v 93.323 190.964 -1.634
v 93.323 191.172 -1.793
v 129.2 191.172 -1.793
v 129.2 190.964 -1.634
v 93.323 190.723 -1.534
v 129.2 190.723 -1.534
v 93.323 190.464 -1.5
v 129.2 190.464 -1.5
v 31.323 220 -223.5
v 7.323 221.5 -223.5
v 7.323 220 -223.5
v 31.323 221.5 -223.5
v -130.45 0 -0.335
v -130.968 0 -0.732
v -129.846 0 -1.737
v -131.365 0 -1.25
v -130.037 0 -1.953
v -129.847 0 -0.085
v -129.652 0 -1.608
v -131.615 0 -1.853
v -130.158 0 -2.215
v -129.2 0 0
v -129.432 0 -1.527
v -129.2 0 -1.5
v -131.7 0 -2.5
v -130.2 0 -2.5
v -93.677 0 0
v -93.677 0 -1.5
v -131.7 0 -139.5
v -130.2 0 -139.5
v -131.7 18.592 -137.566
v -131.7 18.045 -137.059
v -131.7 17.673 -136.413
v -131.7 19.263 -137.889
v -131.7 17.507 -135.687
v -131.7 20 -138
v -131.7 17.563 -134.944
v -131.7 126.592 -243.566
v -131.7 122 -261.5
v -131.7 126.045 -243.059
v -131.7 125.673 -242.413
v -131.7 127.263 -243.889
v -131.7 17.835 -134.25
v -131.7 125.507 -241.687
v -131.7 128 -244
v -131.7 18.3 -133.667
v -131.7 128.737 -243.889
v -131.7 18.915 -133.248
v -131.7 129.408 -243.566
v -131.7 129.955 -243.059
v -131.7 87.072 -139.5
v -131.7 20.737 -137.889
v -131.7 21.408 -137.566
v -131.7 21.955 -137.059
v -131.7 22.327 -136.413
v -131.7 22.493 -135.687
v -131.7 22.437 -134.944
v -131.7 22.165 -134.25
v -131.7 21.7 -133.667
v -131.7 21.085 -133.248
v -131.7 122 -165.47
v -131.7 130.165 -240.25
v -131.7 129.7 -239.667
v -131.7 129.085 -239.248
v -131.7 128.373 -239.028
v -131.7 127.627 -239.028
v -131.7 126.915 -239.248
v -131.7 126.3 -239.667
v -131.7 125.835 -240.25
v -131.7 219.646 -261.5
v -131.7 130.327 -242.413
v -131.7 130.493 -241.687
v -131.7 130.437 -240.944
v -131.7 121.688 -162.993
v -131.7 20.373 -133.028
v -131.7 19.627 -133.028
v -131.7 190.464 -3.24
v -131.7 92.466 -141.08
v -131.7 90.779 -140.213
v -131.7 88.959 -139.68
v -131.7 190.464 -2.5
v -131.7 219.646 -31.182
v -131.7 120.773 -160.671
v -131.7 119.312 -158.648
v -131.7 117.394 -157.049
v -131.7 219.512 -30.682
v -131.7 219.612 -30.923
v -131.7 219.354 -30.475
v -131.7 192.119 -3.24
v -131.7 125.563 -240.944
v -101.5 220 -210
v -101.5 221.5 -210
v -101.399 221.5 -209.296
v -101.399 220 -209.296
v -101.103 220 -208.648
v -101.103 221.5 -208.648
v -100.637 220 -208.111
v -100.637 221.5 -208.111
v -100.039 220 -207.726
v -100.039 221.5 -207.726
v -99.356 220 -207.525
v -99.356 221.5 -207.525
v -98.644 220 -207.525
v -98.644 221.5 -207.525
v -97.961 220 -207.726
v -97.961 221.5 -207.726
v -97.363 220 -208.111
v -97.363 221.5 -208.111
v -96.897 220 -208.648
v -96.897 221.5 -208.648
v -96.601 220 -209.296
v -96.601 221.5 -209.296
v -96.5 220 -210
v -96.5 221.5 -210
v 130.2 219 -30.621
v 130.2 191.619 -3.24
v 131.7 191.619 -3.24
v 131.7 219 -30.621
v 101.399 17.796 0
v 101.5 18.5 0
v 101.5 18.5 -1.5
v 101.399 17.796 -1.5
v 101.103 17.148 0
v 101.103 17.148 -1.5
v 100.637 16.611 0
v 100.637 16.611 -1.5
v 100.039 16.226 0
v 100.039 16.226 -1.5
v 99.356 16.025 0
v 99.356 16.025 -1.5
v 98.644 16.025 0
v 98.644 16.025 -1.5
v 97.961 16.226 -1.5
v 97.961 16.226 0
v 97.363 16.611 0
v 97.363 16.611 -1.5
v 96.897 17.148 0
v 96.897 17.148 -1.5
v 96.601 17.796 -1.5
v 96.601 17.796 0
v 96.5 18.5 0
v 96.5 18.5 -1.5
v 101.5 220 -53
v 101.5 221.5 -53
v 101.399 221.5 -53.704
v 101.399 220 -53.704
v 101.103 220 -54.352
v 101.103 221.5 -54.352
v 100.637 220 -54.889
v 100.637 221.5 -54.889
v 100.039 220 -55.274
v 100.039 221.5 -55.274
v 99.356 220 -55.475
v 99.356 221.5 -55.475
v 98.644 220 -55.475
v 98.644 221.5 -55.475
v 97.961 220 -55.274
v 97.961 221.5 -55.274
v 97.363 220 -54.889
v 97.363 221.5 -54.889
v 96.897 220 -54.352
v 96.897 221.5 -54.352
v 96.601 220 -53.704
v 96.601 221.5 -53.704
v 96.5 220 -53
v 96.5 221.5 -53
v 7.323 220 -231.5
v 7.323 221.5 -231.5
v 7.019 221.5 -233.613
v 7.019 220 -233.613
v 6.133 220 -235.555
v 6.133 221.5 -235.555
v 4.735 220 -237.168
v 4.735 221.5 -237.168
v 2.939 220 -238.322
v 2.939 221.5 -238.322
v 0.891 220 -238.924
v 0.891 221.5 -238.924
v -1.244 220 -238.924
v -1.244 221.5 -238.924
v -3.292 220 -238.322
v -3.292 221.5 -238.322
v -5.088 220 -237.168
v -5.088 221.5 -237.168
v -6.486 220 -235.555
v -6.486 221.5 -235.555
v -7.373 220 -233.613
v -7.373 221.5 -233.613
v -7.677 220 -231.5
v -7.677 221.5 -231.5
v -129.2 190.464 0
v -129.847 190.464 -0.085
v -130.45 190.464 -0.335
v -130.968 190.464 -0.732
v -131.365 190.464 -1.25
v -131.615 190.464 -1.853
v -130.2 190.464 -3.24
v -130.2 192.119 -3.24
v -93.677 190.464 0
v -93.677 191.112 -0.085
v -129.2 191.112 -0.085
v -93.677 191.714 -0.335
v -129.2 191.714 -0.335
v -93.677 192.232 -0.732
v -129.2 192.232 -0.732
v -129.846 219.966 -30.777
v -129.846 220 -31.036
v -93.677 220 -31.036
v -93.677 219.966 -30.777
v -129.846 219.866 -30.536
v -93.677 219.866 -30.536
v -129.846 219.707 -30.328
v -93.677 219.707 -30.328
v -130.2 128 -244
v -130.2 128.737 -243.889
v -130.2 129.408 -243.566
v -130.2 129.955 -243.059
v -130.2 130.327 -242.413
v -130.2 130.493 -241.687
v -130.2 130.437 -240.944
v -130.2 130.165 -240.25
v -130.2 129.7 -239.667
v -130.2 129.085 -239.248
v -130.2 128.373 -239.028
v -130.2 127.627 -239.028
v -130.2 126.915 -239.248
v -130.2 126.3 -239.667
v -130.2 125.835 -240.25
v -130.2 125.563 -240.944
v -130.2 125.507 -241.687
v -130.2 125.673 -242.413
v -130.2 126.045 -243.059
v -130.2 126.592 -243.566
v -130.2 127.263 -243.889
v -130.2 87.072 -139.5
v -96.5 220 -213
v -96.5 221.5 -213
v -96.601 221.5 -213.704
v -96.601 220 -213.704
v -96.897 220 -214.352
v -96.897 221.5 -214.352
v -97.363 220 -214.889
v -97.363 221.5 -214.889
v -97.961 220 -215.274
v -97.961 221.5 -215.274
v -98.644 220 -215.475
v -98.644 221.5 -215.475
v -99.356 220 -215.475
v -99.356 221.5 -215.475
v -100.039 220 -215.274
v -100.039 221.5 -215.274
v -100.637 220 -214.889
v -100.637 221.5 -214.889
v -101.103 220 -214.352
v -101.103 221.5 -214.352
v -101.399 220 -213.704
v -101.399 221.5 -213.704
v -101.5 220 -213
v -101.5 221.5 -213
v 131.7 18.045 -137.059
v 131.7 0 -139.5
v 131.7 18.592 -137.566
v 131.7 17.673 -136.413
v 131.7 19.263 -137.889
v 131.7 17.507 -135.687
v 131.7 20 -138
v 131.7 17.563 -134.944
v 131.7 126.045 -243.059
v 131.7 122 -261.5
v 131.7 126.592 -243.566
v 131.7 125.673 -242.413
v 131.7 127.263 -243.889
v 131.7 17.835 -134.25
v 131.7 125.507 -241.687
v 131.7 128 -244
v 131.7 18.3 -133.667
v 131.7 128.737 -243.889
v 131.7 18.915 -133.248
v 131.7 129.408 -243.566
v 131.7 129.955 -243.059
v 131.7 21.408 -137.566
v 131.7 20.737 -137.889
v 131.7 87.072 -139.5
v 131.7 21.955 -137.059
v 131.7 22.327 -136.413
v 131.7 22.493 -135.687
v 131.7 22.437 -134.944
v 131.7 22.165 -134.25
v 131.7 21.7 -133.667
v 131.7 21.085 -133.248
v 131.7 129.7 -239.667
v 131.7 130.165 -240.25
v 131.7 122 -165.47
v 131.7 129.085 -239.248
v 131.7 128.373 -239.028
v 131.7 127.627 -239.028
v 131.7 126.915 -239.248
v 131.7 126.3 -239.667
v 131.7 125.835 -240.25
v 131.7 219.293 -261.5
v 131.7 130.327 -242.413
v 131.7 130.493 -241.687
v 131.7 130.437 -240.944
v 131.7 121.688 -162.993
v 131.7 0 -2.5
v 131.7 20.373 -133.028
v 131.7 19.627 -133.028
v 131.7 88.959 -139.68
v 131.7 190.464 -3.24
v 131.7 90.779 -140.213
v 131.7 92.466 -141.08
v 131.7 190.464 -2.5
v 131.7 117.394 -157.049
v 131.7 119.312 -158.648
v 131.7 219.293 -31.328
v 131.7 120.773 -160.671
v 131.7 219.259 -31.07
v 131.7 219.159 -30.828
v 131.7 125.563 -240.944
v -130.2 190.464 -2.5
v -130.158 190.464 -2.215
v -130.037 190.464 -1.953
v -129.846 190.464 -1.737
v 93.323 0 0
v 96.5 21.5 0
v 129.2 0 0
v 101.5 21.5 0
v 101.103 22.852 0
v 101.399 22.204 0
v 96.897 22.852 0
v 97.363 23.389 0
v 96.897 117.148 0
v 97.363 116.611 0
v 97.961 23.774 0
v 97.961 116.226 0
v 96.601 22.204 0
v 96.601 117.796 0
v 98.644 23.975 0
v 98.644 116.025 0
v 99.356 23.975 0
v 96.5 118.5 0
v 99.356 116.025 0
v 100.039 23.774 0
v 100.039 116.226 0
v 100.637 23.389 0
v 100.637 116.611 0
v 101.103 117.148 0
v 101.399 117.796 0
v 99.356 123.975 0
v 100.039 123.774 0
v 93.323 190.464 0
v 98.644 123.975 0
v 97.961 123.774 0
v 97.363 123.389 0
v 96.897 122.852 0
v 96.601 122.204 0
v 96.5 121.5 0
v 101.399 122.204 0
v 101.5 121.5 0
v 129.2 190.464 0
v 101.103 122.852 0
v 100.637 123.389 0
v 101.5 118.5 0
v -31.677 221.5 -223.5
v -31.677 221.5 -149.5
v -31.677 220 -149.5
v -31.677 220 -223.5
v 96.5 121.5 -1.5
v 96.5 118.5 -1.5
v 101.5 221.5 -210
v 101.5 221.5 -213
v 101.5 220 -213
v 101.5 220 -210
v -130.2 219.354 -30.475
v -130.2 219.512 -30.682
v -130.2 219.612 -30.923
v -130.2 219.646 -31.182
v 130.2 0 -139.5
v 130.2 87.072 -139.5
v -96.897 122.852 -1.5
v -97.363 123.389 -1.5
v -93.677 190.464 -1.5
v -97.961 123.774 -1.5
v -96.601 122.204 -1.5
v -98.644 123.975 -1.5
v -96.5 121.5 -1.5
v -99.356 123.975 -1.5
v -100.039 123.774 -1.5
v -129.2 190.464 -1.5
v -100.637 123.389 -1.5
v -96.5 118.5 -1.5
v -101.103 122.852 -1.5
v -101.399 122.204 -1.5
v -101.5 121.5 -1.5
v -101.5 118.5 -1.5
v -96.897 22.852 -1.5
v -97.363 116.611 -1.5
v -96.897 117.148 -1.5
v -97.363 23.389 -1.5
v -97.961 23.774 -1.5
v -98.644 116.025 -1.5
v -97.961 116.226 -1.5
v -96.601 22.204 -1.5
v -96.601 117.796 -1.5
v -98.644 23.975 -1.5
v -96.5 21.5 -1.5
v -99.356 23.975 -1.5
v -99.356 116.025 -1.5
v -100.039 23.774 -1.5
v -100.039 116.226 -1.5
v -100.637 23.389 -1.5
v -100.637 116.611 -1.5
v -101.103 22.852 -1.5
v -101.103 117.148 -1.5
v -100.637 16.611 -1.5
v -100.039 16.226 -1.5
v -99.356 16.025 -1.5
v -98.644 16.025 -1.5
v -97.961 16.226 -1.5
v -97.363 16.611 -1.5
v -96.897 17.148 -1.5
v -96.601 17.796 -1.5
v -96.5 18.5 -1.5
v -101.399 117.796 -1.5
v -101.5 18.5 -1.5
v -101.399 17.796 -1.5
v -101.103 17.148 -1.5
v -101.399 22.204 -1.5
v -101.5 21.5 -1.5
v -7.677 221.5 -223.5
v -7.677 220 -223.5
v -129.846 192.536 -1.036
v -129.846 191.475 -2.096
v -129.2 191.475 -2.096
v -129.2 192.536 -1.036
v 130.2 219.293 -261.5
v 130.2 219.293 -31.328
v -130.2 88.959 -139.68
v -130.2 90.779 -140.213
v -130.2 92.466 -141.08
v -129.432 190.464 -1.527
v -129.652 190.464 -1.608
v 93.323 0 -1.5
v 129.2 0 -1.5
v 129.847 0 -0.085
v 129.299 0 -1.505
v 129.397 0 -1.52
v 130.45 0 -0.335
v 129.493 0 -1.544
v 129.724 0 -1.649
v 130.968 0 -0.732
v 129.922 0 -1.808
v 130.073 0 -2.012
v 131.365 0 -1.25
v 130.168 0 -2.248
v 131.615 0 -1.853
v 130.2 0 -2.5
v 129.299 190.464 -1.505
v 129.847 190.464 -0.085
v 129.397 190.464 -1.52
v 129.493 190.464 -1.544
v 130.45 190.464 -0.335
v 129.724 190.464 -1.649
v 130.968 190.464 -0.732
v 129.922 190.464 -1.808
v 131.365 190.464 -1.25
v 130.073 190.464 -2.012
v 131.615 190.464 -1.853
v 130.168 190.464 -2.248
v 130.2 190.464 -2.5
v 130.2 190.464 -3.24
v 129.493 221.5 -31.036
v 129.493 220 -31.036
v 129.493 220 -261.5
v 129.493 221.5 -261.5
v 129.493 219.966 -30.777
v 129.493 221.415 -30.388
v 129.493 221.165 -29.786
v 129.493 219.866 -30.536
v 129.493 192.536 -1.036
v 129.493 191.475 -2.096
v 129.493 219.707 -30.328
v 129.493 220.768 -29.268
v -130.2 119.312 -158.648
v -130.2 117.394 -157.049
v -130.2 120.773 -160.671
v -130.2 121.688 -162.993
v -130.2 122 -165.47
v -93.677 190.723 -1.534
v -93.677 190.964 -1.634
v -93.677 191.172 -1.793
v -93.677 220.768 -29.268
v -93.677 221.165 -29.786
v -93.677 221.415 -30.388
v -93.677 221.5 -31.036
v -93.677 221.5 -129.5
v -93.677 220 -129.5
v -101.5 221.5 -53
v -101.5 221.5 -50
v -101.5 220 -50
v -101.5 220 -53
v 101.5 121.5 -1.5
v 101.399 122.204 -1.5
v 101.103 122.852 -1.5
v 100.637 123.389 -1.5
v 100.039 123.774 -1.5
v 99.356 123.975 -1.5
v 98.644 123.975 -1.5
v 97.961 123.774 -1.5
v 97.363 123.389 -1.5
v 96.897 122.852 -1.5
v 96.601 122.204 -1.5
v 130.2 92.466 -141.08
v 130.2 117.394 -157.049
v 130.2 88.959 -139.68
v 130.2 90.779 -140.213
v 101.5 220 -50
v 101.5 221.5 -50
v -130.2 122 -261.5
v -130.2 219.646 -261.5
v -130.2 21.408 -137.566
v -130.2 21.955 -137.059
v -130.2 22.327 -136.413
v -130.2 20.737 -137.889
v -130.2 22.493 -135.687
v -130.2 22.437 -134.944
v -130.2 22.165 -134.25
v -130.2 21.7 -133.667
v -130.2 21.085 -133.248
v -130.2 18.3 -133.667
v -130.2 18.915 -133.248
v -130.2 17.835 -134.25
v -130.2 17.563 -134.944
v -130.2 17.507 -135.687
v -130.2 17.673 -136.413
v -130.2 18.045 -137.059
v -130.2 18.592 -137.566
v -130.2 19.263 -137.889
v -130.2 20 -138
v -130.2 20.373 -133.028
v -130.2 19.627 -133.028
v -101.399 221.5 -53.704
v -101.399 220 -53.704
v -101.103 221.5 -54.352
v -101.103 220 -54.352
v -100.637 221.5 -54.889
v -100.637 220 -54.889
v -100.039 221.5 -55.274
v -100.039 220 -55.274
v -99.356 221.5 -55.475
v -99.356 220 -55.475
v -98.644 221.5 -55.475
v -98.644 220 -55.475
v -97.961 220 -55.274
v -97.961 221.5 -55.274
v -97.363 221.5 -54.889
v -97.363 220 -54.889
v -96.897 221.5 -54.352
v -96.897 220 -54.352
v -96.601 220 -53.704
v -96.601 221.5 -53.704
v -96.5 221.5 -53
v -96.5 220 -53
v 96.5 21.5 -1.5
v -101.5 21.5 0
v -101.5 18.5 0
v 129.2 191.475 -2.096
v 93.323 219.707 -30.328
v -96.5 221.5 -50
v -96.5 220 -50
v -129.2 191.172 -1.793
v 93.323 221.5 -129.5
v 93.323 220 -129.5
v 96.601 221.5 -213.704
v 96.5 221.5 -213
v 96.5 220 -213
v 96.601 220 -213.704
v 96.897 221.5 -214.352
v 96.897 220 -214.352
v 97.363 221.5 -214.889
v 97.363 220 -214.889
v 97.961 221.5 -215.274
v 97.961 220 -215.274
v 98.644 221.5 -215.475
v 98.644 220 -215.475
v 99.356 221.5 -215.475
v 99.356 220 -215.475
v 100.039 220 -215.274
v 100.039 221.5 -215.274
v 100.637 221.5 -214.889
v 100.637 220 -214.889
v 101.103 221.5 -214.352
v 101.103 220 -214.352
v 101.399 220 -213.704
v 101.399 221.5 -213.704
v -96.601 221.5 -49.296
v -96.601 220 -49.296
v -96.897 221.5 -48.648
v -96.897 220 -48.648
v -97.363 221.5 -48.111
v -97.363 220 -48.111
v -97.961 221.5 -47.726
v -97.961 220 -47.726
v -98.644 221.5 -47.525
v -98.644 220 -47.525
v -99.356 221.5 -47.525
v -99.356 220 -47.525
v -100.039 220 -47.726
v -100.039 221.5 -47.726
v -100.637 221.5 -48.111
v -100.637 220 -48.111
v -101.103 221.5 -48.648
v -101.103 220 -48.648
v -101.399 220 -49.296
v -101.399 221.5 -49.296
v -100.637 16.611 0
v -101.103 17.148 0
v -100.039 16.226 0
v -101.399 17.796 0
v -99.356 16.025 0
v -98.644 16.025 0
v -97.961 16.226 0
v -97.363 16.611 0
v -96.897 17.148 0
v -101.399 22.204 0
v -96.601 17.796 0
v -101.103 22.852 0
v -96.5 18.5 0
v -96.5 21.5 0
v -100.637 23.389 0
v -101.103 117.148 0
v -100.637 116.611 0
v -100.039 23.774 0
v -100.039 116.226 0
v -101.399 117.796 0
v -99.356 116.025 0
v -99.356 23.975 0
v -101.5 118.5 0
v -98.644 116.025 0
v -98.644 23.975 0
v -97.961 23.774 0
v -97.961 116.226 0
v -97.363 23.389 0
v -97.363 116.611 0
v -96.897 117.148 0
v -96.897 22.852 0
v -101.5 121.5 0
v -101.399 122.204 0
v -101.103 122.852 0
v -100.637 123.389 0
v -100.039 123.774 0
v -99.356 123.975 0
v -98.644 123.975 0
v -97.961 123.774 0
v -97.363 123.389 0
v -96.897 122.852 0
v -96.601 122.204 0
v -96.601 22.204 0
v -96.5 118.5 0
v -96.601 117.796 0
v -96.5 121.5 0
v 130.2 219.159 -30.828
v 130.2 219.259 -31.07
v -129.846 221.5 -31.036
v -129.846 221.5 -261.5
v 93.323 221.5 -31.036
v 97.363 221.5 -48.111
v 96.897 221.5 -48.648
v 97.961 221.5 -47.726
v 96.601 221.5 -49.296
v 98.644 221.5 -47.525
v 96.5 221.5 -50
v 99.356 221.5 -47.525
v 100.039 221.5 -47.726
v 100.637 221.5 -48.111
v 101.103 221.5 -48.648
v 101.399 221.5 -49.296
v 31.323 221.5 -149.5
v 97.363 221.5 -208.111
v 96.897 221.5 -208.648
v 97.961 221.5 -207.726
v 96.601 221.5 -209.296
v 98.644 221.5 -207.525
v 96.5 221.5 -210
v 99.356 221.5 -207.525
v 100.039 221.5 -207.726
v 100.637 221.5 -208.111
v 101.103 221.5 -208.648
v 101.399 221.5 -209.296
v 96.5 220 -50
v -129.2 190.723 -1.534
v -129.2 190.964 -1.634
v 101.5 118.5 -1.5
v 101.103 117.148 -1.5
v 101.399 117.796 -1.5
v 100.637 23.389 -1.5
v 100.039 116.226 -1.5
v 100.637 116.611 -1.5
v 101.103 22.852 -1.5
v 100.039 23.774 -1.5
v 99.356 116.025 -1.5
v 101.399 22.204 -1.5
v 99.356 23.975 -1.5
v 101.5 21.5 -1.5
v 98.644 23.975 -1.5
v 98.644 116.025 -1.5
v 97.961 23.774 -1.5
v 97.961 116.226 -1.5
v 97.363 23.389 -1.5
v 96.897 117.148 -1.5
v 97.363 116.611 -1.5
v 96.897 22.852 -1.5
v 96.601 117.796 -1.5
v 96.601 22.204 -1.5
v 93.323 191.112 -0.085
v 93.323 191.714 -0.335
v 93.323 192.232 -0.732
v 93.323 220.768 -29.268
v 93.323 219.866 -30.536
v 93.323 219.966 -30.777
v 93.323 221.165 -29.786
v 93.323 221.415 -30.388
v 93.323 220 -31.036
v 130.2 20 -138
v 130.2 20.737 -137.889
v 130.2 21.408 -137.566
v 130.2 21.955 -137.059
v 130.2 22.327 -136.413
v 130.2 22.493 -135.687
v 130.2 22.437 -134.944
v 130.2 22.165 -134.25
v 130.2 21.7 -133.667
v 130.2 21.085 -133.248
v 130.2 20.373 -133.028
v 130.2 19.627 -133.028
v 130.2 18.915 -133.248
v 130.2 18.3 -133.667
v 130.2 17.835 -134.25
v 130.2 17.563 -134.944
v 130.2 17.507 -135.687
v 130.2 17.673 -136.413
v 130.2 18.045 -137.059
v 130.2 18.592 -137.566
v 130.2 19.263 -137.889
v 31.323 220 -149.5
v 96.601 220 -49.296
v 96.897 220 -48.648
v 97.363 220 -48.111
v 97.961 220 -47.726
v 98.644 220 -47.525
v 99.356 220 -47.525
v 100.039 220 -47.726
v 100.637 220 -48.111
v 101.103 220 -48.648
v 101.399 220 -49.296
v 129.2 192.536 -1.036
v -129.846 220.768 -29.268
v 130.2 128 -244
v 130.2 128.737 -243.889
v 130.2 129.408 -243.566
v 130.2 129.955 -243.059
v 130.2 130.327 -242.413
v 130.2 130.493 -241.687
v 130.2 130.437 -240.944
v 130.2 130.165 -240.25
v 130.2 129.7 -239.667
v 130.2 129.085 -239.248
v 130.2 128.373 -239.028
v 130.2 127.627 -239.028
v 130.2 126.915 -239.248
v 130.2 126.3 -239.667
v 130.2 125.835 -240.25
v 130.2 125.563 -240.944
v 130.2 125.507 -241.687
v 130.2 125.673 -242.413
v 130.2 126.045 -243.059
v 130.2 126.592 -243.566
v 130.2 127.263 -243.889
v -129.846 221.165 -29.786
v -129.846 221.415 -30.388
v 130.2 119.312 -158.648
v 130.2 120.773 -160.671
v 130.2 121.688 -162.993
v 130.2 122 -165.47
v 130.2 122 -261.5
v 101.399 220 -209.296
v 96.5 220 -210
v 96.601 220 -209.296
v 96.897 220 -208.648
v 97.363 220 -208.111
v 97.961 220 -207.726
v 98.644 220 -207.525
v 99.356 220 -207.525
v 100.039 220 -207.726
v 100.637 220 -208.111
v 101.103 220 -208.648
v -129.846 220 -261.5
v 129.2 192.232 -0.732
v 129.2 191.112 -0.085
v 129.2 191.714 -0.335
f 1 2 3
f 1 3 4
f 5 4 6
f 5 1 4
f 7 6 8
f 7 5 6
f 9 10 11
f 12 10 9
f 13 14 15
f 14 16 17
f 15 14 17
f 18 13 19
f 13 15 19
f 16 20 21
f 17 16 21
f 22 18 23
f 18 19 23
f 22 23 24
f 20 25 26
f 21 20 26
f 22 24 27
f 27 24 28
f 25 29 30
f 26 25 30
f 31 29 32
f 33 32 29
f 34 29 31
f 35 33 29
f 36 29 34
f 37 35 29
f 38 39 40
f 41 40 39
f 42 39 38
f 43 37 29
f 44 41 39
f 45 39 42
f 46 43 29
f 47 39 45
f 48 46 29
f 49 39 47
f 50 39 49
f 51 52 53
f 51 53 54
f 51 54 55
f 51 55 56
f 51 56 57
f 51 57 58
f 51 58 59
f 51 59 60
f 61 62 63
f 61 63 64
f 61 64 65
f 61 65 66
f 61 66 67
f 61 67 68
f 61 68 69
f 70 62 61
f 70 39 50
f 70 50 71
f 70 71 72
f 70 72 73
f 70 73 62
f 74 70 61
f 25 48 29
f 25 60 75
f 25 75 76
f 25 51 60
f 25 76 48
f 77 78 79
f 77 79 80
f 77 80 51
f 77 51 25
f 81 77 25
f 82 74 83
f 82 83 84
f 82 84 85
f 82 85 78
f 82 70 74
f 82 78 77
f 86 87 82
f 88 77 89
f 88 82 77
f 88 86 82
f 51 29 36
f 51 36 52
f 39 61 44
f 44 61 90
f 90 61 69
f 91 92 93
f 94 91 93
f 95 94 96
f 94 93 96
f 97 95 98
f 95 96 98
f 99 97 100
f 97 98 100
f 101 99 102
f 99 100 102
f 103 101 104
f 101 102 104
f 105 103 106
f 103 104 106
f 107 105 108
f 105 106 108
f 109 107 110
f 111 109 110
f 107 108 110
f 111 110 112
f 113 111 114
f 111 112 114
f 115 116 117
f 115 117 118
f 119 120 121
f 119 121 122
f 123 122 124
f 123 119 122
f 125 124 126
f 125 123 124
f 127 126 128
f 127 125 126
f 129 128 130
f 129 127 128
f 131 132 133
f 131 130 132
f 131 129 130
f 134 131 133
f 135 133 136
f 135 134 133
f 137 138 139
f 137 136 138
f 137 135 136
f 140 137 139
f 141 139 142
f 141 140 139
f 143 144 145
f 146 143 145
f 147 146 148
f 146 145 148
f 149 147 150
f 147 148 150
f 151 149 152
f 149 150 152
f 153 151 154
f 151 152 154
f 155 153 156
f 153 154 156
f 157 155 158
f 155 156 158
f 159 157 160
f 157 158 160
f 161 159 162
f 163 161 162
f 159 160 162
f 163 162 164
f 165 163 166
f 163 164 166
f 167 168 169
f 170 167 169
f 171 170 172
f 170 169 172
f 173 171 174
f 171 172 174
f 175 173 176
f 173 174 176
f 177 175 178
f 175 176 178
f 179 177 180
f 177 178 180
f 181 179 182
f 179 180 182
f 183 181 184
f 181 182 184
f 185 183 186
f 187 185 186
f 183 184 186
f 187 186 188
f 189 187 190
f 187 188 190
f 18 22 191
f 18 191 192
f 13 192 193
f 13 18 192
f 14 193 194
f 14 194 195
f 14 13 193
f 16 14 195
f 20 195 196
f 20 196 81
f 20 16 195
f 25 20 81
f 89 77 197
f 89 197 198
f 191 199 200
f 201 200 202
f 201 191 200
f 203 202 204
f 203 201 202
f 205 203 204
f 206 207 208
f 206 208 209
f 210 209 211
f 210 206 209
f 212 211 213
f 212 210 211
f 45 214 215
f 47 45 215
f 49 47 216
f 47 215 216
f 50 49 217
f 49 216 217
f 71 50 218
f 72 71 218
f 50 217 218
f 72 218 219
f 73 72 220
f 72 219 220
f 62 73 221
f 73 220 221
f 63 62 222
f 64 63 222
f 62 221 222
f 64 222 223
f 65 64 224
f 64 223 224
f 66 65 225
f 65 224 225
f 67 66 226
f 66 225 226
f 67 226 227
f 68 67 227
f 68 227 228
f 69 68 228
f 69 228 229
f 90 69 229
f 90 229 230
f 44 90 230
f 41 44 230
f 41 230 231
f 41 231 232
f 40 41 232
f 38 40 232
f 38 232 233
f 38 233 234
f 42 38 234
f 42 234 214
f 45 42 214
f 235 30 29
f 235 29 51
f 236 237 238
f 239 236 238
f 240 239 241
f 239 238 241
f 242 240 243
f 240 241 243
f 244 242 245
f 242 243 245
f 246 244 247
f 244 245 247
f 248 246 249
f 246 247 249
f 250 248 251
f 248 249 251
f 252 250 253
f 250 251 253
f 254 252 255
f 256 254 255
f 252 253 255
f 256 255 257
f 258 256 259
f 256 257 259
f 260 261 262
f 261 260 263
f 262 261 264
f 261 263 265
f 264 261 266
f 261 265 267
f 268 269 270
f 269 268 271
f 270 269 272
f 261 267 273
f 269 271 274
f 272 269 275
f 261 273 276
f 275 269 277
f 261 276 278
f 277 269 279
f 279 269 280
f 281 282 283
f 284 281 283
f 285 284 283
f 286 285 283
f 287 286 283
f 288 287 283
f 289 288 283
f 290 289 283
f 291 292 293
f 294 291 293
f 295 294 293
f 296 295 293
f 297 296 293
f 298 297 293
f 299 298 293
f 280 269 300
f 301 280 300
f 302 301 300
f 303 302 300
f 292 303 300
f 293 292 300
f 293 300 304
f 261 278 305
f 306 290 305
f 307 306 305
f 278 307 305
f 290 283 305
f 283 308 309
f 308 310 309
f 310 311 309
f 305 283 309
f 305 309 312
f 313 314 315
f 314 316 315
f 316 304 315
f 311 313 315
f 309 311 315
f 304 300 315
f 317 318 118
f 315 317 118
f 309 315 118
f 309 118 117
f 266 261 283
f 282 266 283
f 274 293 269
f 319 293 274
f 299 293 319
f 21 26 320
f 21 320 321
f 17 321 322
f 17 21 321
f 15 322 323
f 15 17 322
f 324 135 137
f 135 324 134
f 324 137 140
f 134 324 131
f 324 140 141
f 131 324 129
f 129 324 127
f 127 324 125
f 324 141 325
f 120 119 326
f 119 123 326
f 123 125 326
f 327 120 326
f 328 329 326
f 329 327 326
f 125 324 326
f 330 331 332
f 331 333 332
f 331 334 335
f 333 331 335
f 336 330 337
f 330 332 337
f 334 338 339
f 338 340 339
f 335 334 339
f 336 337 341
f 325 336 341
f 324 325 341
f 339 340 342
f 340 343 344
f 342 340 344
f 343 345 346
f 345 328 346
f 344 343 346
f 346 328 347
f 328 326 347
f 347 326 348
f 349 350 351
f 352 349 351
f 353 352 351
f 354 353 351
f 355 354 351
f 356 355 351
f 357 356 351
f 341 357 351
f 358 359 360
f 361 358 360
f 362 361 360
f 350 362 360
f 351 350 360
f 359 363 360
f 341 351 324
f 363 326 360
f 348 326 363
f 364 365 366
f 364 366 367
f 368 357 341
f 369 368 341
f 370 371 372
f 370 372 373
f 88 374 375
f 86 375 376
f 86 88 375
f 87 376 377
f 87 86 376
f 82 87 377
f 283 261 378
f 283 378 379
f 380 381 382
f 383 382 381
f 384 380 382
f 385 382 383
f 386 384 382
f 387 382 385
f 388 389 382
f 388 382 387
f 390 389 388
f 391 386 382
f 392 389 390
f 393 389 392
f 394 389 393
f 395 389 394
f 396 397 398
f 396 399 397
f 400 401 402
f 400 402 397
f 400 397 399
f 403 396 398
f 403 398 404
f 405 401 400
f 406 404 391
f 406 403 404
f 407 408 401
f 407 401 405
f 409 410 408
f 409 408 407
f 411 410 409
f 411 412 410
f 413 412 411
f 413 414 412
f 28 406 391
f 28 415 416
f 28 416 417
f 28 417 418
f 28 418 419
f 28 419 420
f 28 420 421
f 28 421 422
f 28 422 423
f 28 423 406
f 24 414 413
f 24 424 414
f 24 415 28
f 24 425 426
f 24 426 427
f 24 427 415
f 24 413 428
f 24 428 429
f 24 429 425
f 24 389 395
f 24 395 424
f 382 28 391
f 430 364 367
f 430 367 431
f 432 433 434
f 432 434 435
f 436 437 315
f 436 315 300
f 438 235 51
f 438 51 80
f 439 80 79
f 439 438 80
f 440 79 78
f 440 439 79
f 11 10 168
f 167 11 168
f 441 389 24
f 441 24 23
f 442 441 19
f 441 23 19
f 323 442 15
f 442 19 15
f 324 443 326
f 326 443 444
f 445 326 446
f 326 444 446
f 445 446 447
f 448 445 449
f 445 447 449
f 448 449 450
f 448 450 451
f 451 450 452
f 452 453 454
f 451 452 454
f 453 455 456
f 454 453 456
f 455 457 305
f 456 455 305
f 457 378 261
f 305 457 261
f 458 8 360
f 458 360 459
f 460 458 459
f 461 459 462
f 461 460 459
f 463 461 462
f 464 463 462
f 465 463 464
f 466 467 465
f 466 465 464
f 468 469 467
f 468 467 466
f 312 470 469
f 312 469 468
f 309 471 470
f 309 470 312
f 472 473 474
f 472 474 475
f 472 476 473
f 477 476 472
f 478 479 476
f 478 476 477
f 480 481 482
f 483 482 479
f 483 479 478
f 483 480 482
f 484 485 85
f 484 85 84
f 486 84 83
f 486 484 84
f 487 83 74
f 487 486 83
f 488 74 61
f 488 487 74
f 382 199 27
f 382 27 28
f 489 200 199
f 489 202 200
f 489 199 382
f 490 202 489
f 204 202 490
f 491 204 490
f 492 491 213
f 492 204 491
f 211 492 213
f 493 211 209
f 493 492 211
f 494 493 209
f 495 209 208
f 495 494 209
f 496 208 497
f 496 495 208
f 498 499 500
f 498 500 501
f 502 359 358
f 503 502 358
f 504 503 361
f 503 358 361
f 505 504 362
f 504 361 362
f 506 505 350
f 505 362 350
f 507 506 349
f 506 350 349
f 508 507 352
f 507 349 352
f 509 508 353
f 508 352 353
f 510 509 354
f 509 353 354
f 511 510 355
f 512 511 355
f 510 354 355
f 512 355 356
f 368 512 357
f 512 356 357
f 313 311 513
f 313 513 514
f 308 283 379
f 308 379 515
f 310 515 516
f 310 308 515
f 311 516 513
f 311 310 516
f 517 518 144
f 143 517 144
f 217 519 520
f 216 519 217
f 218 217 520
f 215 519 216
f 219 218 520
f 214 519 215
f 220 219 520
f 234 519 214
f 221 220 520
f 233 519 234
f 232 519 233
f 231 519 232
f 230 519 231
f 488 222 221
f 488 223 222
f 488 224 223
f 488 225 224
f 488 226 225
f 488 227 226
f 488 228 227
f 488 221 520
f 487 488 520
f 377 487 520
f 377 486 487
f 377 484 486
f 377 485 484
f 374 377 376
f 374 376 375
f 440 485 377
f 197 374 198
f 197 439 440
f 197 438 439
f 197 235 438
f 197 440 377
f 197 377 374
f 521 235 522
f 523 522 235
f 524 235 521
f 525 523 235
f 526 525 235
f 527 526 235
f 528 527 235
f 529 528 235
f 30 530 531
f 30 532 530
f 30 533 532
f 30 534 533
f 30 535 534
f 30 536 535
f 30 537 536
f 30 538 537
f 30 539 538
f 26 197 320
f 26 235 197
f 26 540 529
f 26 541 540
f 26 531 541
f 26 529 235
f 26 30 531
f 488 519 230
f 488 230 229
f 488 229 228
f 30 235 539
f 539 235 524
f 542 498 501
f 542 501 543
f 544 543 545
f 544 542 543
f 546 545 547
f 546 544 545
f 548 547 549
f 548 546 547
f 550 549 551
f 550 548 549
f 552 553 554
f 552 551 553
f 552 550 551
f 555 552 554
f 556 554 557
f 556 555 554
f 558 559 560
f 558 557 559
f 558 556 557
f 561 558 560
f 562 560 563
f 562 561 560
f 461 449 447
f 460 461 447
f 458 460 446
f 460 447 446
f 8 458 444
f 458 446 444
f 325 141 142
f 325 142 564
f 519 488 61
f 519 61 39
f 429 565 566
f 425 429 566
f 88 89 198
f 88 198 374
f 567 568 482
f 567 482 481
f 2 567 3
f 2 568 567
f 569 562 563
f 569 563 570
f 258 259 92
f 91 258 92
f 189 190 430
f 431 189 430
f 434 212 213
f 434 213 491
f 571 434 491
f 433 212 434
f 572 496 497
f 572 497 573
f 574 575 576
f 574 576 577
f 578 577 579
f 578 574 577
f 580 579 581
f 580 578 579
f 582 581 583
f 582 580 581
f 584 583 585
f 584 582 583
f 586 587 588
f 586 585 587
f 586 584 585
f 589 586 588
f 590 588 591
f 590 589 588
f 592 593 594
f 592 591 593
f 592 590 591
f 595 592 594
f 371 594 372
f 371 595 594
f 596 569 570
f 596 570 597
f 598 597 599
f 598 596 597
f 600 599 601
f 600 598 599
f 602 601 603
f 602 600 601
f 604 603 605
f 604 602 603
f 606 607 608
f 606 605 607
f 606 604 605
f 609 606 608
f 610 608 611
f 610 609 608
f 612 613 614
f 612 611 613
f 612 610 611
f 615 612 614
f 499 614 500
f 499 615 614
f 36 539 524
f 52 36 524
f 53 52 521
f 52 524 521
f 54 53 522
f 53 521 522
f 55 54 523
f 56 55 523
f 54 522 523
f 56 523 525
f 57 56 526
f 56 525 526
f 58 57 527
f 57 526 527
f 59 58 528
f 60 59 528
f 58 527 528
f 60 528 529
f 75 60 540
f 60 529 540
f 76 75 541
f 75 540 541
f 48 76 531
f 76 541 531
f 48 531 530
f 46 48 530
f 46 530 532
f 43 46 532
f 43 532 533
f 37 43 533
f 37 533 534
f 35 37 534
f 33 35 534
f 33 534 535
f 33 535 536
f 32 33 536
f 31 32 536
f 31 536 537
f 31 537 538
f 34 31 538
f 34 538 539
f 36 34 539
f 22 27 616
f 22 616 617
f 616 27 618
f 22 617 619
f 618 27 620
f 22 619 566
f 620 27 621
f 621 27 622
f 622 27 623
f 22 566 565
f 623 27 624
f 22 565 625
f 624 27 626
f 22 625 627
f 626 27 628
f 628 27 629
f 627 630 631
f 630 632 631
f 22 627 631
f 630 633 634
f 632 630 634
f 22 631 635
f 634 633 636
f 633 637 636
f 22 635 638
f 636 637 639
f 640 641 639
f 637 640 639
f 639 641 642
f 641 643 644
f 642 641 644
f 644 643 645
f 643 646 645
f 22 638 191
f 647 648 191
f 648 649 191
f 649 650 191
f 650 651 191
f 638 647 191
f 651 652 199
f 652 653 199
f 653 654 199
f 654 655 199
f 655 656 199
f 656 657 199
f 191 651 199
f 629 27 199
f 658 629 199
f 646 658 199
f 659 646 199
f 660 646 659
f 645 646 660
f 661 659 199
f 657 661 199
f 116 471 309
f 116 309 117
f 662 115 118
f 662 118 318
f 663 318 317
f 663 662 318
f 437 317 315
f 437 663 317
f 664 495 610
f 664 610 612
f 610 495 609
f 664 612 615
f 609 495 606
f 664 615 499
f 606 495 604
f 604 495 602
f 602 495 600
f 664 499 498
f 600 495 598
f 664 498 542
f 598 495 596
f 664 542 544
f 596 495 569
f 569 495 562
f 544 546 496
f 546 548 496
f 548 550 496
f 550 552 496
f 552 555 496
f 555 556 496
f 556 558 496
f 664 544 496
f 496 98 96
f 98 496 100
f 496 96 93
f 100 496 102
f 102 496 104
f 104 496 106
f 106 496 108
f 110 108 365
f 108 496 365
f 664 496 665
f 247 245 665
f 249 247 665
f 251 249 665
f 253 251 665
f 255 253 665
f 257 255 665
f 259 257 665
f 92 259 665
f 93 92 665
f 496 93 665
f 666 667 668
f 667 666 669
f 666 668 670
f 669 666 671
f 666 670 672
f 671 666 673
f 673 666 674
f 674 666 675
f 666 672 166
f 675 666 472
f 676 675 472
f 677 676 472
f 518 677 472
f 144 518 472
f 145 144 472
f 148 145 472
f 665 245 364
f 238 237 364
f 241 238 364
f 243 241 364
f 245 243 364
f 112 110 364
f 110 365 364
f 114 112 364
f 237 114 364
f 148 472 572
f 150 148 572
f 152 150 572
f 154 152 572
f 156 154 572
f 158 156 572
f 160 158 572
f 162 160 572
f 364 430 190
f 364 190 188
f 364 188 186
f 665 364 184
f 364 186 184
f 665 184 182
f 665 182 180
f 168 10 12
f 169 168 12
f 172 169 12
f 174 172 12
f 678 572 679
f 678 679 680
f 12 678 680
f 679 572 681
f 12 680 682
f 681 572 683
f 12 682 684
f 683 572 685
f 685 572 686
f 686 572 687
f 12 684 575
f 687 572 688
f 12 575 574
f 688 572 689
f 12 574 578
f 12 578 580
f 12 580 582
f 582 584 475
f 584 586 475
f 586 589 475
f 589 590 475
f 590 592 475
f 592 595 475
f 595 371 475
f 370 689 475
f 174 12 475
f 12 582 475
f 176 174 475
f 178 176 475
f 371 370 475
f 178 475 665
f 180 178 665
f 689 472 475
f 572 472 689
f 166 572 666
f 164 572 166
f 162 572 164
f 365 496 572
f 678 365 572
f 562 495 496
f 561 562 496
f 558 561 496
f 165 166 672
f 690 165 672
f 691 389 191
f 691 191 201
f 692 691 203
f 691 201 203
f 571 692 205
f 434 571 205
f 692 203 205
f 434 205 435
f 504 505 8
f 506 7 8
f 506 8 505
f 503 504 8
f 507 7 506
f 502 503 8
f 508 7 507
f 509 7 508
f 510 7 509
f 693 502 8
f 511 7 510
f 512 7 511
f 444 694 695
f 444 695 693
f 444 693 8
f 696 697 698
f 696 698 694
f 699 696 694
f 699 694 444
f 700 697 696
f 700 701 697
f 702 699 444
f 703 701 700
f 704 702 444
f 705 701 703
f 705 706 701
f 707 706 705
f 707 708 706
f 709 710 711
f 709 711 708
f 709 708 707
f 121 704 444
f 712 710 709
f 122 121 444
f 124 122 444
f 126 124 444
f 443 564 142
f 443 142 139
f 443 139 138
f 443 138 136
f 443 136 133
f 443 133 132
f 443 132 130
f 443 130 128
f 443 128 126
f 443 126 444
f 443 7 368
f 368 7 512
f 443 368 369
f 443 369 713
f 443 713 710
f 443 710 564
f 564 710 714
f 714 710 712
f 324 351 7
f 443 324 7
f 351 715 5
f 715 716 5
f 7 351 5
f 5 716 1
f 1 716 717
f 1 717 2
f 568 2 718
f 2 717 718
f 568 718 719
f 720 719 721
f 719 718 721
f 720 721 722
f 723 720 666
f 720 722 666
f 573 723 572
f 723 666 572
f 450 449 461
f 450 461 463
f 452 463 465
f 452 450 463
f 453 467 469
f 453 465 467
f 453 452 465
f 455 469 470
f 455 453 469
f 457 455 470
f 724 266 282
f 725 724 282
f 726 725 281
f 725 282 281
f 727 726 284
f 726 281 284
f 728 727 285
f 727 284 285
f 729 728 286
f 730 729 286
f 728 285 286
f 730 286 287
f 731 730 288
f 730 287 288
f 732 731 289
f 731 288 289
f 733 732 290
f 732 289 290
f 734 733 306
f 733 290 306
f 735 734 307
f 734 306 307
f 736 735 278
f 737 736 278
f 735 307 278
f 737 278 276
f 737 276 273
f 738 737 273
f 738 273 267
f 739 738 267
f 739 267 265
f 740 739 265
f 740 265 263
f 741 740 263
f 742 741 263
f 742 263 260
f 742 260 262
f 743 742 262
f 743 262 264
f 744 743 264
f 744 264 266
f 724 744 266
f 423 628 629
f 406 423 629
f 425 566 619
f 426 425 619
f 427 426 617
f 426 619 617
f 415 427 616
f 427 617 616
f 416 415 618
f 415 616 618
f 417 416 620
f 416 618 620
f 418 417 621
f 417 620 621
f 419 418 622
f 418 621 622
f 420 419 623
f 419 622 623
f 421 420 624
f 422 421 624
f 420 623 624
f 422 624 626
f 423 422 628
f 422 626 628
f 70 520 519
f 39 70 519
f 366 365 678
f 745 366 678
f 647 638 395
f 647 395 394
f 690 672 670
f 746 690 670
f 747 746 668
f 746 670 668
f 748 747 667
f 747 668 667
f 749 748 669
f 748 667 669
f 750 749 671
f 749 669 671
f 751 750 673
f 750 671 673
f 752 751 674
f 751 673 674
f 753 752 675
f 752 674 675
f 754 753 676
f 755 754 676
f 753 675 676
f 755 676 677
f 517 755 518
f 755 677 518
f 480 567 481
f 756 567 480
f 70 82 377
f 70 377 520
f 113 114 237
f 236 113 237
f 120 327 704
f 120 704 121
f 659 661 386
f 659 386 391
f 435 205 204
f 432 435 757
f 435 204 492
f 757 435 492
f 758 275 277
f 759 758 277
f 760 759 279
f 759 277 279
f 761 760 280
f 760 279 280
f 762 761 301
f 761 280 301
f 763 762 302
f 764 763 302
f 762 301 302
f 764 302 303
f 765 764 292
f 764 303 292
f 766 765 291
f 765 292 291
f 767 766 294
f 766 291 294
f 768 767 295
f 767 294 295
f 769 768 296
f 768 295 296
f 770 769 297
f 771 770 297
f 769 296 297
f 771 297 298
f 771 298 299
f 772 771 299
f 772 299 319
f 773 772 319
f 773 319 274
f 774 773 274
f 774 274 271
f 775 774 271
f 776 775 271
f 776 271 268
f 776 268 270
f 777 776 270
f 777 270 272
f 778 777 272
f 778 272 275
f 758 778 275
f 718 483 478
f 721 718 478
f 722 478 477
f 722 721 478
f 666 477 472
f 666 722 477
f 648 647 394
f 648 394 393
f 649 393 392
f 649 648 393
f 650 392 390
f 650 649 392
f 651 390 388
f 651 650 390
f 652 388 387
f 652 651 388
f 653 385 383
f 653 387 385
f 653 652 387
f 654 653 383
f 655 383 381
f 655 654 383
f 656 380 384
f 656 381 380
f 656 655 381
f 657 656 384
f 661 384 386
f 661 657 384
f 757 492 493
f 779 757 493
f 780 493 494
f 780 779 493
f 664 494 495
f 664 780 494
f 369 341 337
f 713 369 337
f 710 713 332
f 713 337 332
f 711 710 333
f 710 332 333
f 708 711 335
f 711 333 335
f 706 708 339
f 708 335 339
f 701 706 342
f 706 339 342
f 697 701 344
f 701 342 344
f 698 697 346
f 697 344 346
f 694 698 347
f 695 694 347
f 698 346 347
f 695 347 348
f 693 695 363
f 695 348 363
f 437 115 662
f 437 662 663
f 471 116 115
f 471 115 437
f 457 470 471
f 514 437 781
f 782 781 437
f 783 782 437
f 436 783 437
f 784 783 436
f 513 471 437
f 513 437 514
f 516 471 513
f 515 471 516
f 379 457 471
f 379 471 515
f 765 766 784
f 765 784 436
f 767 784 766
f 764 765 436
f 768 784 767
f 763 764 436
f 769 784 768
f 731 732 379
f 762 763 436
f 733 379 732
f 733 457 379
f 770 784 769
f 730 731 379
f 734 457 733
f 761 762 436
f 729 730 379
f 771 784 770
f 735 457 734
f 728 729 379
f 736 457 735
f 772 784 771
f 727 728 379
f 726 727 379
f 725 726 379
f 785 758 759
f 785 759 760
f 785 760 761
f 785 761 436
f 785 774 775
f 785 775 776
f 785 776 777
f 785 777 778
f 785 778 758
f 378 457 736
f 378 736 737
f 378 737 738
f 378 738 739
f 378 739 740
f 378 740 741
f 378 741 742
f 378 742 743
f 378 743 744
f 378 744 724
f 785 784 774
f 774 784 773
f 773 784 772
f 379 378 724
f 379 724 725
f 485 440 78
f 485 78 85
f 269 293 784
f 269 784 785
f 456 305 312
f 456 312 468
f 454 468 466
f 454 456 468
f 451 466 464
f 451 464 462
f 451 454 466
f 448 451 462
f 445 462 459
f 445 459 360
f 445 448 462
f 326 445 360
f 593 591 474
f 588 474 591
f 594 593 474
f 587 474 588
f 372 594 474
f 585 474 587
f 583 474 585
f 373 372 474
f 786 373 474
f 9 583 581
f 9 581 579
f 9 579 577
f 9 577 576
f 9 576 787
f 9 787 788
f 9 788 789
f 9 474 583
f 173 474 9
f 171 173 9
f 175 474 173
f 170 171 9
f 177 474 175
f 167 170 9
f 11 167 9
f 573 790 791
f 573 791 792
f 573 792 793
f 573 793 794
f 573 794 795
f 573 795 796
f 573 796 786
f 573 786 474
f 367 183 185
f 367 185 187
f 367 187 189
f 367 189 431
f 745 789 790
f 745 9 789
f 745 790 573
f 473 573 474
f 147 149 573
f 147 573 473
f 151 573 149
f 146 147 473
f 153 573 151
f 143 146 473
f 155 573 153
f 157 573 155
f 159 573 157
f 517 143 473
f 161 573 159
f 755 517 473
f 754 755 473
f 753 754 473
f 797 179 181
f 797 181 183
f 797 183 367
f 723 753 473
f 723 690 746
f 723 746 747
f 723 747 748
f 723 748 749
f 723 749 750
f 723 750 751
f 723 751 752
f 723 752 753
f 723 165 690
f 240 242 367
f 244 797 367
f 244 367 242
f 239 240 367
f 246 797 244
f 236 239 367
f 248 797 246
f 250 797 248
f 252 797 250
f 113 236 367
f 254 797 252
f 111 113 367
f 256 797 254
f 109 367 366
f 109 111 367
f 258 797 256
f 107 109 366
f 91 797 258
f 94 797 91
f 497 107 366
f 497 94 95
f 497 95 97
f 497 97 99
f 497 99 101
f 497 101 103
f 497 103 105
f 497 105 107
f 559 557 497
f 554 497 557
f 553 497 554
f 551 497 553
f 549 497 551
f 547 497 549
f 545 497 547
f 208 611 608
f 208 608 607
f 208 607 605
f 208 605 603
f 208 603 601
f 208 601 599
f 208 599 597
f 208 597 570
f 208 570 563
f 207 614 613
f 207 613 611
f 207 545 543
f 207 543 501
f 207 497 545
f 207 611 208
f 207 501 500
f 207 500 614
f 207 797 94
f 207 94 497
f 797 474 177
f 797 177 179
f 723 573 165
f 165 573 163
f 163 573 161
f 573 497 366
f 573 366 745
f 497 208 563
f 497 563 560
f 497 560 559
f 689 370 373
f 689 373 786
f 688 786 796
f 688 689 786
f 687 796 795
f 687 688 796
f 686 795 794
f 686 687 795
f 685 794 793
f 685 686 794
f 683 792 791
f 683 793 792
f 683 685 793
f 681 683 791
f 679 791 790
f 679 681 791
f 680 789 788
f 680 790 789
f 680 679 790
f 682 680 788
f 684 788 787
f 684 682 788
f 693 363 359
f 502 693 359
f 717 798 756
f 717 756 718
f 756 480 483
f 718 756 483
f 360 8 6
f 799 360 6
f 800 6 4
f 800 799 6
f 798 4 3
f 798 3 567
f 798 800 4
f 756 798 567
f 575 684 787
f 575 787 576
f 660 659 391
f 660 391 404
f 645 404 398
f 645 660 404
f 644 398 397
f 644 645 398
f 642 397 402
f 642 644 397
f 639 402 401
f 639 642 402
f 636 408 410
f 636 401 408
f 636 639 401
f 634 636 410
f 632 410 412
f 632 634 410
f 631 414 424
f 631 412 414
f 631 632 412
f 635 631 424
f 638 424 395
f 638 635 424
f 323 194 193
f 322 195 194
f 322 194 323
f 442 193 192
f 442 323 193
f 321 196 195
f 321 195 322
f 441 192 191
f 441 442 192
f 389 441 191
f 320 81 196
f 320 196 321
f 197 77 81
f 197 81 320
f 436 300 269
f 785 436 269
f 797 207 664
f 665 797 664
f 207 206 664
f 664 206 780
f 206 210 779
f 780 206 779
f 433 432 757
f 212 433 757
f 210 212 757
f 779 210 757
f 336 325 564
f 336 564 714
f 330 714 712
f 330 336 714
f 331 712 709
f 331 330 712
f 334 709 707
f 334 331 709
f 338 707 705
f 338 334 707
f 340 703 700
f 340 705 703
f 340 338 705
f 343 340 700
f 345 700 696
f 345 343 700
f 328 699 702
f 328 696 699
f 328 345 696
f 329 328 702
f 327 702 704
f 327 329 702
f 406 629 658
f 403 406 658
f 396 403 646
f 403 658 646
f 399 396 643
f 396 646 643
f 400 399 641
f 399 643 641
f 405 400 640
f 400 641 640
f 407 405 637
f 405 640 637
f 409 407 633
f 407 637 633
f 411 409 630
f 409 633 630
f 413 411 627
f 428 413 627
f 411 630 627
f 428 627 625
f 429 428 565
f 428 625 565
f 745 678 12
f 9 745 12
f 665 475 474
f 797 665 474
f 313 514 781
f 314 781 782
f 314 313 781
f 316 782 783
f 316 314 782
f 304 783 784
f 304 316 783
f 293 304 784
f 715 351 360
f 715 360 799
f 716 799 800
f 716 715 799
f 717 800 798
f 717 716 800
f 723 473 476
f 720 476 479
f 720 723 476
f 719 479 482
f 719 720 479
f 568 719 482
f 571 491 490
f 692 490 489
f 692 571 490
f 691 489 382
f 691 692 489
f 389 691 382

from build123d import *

# Parameters (mm, degrees)
EXTRUDE_1_DEPTH       = 131.7
CUT_EXTRUDE_1_DEPTH   = 433.231488904
SHEET_START           = -129.846446609
SHEET_METAL_1_DEPTH   = 259.339339828
SHEET_START_2         = 129.492893219
SHEET_METAL_1_2_DEPTH = 3.507106781
SHEET_START_3         = -133
SHEET_METAL_1_3_DEPTH = 3.153553391
SHEET_START_4         = -130.2
SHEET_METAL_1_4_DEPTH = 1
SHEET_START_5         = 129.2
SHEET_METAL_1_5_DEPTH = 0.292893219
SHEET_START_6         = -1
SHEET_METAL_1_6_DEPTH = 220.292893219
SHEET_METAL_1_7_DEPTH = 190.464466094
SKETCH_5_W            = 187
SKETCH_5_H            = 129.5
SKETCH_5_W_2          = 63
SKETCH_5_H_2          = 74
CUT_EXTRUDE_2_DEPTH   = 368.136745641
CUT_EXTRUDE_3_REACH   = 369.137
CUT_EXTRUDE_4_REACH   = 369.137
CUT_EXTRUDE_5_REACH   = 369.137
HOLE_WIZARD_M4_1_D    = 5


with BuildPart() as part:
    # Sketch 1 → 凸台-拉伸1 (new, symmetric)
    with BuildSketch(Plane(origin=(0, 0, 0), x_dir=(0, 0, -1), z_dir=(1, 0, 0))):
        Polygon((0, 0), (0, 191.5), (30, 221.5), (261.5, 221.5), (261.5, 0), align=None)
    extrude(amount=EXTRUDE_1_DEPTH, both=True)

    # 草图4 → 切除-拉伸1 (cut, through all)
    with BuildSketch(Plane(origin=(131.7, 0, 0), x_dir=(0, 0, -1), z_dir=(1, 0, 0))):
        with BuildLine():
            Line((261.5, 0), (139.5, 0))
            Line((139.5, 0), (139.5, 87.07156618))
            ThreePointArc((139.5, 87.07156618), (139.90304117, 89.881972061), (141.079676243, 92.465836087))
            Line((141.079676243, 92.465836087), (157.049454159, 117.394269907))
            ThreePointArc((157.049454159, 117.394269907), (160.670960305, 120.773331724), (165.469777916, 122))
            Line((165.469777916, 122), (261.5, 122))
            Line((261.5, 122), (261.5, 0))
        make_face()
    extrude(amount=-CUT_EXTRUDE_1_DEPTH, mode=Mode.SUBTRACT)

    # Sheet Metal 1: read off the stored shape, not the designer's step
    # Sheet Metal 1 outline → Sheet Metal 1 (cut)
    with BuildSketch(Plane.YZ.offset(SHEET_START)):
        with BuildLine():
            Line((220, -261.5), (220, -31.035533906))
            ThreePointArc((220, -31.035533906), (219.923879533, -30.652850474), (219.707106781, -30.328427125))
            Line((219.707106781, -30.328427125), (191.171572875, -1.792893219))
            ThreePointArc((191.171572875, -1.792893219), (190.847149526, -1.576120467), (190.464466094, -1.5))
            Line((190.464466094, -1.5), (0, -1.5))
            Line((0, -1.5), (0, -139.5))
            Line((0, -139.5), (87.07156618, -139.5))
            ThreePointArc((87.07156618, -139.5), (89.881972061, -139.90304117), (92.465836087, -141.079676243))
            Line((92.465836087, -141.079676243), (117.394269907, -157.049454159))
            ThreePointArc((117.394269907, -157.049454159), (120.773331724, -160.670960305), (122, -165.469777916))
            Line((122, -165.469777916), (122, -261.5))
            Line((122, -261.5), (220, -261.5))
        make_face()
        with BuildLine():
            ThreePointArc((220.767766953, -29.267766953), (221.309698831, -30.078825325), (221.5, -31.035533906))
            Line((221.5, -31.035533906), (221.5, -30))
            Line((221.5, -30), (220.767766953, -29.267766953))
        make_face()
        with BuildLine():
            Line((191.5, 0), (190.464466094, 0))
            ThreePointArc((190.464466094, 0), (191.421174675, -0.190301169), (192.232233047, -0.732233047))
            Line((192.232233047, -0.732233047), (191.5, 0))
        make_face()
    extrude(amount=SHEET_METAL_1_DEPTH, mode=Mode.SUBTRACT)

    # Sheet Metal 1 2 outline → Sheet Metal 1 2 (cut)
    with BuildSketch(Plane.YZ.offset(SHEET_START_2)):
        with BuildLine():
            ThreePointArc((219, -30.621320344), (219.216772751, -30.945743693), (219.292893219, -31.328427125))
            Line((219.292893219, -31.328427125), (219.292893219, -261.5))
            Line((219.292893219, -261.5), (221.5, -261.5))
            Line((221.5, -261.5), (221.5, -30))
            Line((221.5, -30), (191.5, 0))
            Line((191.5, 0), (190.464466094, 0))
            Line((190.464466094, 0), (190.464466094, -3.240249))
            Line((190.464466094, -3.240249), (191.618928656, -3.240249))
            Line((191.618928656, -3.240249), (219, -30.621320344))
        make_face()
    extrude(amount=SHEET_METAL_1_2_DEPTH, mode=Mode.SUBTRACT)

    # Sheet Metal 1 3 outline → Sheet Metal 1 3 (cut)
    with BuildSketch(Plane.YZ.offset(SHEET_START_3)):
        with BuildLine():
            Line((219.646446609, -31.181980515), (219.646446609, -261.5))
            Line((219.646446609, -261.5), (221.5, -261.5))
            Line((221.5, -261.5), (221.5, -30))
            Line((221.5, -30), (191.5, 0))
            Line((191.5, 0), (190.464466094, 0))
            Line((190.464466094, 0), (190.464466094, -3.240249))
            Line((190.464466094, -3.240249), (192.118928656, -3.240249))
            Line((192.118928656, -3.240249), (219.353553391, -30.474873734))
            ThreePointArc((219.353553391, -30.474873734), (219.570326142, -30.799297083), (219.646446609, -31.181980515))
        make_face()
    extrude(amount=SHEET_METAL_1_3_DEPTH, mode=Mode.SUBTRACT)

    # Sheet Metal 1 4 outline → Sheet Metal 1 4 (cut)
    with BuildSketch(Plane.YZ.offset(SHEET_START_4)):
        with BuildLine():
            ThreePointArc((219, -30.621320344), (219.216772751, -30.945743693), (219.292893219, -31.328427125))
            Line((219.292893219, -31.328427125), (219.292893219, -261.5))
            Line((219.292893219, -261.5), (219.646446609, -261.5))
            Line((219.646446609, -261.5), (219.646446609, -31.181980515))
            ThreePointArc((219.646446609, -31.181980515), (219.570326142, -30.799297083), (219.353553391, -30.474873734))
            Line((219.353553391, -30.474873734), (192.118928656, -3.240249))
            Line((192.118928656, -3.240249), (191.618928656, -3.240249))
            Line((191.618928656, -3.240249), (219, -30.621320344))
        make_face()
        with BuildLine():
            Line((190.464466094, 0), (190.464466094, -1.5))
            ThreePointArc((190.464466094, -1.5), (190.847149526, -1.576120467), (191.171572875, -1.792893219))
            Line((191.171572875, -1.792893219), (191.474873734, -2.096194078))
            Line((191.474873734, -2.096194078), (192.535533906, -1.035533906))
            Line((192.535533906, -1.035533906), (192.232233047, -0.732233047))
            ThreePointArc((192.232233047, -0.732233047), (191.421174675, -0.190301169), (190.464466094, 0))
        make_face()
    extrude(amount=SHEET_METAL_1_4_DEPTH, mode=Mode.SUBTRACT)

    # Sheet Metal 1 5 outline → Sheet Metal 1 5 (cut)
    with BuildSketch(Plane.YZ.offset(SHEET_START_5)):
        with BuildLine():
            Line((190.464466094, 0), (190.464466094, -1.5))
            ThreePointArc((190.464466094, -1.5), (190.847149526, -1.576120467), (191.171572875, -1.792893219))
            Line((191.171572875, -1.792893219), (191.474873734, -2.096194078))
            Line((191.474873734, -2.096194078), (192.535533906, -1.035533906))
            Line((192.535533906, -1.035533906), (192.232233047, -0.732233047))
            ThreePointArc((192.232233047, -0.732233047), (191.421174675, -0.190301169), (190.464466094, 0))
        make_face()
    extrude(amount=SHEET_METAL_1_5_DEPTH, mode=Mode.SUBTRACT)

    # Sheet Metal 1 6 outline → Sheet Metal 1 6 (cut)
    with BuildSketch(Plane(origin=(0, 0, 0), x_dir=(1, 0, 0), z_dir=(0, 1, 0)).offset(SHEET_START_6)):
        with BuildLine():
            Line((131.7, 0), (131.7, 2.5))
            ThreePointArc((131.7, 2.5), (130.967766953, 0.732233047), (129.2, 0))
            Line((129.2, 0), (131.7, 0))
        make_face()
        with BuildLine():
            Line((-131.7, 0), (-129.2, 0))
            ThreePointArc((-129.2, 0), (-130.967766953, 0.732233047), (-131.7, 2.5))
            Line((-131.7, 2.5), (-131.7, 0))
        make_face()
        with BuildLine():
            ThreePointArc((129.492893219, 1.543854843), (130.004019035, 1.905396443), (130.2, 2.5))
            Line((130.2, 2.5), (130.2, 261.5))
            Line((130.2, 261.5), (129.492893219, 261.5))
            Line((129.492893219, 261.5), (129.492893219, 1.543854843))
        make_face()
        with BuildLine():
            Line((-129.846446609, 1.737040774), (-129.846446609, 261.5))
            Line((-129.846446609, 261.5), (-130.2, 261.5))
            Line((-130.2, 261.5), (-130.2, 2.5))
            ThreePointArc((-130.2, 2.5), (-130.10731654, 2.079551792), (-129.846446609, 1.737040774))
        make_face()
    extrude(amount=SHEET_METAL_1_6_DEPTH, mode=Mode.SUBTRACT)

    # Sheet Metal 1 7 outline → Sheet Metal 1 7 (add)
    with BuildSketch(Plane(origin=(0, 0, 0), x_dir=(1, 0, 0), z_dir=(0, 1, 0))):
        with BuildLine():
            Line((129.492893219, 1.5), (129.492893219, 1.543854843))
            ThreePointArc((129.492893219, 1.543854843), (129.348079105, 1.51102448), (129.2, 1.5))
            Line((129.2, 1.5), (129.492893219, 1.5))
        make_face()
        with BuildLine():
            Line((-129.846446609, 1.5), (-129.2, 1.5))
            ThreePointArc((-129.2, 1.5), (-129.5442679, 1.561128543), (-129.846446609, 1.737040774))
            Line((-129.846446609, 1.737040774), (-129.846446609, 1.5))
        make_face()
    extrude(amount=SHEET_METAL_1_7_DEPTH)

    # 草图5 → 切除-拉伸2 (cut, through all)
    with BuildSketch(Plane(origin=(0, 221.5, 0), x_dir=(1, 0, 0), z_dir=(0, 1, 0))):
        with Locations((-0.176776695, 64.75)):
            Rectangle(SKETCH_5_W, SKETCH_5_H)
        with Locations((-0.176776695, 186.5)):
            Rectangle(SKETCH_5_W_2, SKETCH_5_H_2)
    extrude(amount=-CUT_EXTRUDE_2_DEPTH, mode=Mode.SUBTRACT)

    # 草图6 → 切除-拉伸3 (cut, up to next)
    with BuildSketch(Plane(origin=(0, 221.5, 0), x_dir=(1, 0, 0), z_dir=(0, 1, 0)), mode=Mode.PRIVATE) as cut_extrude_3_sk1:
        with BuildLine():
            Line((-7.676776695, 231.5), (-7.676776695, 223.5))
            Line((-7.676776695, 223.5), (7.323223305, 223.5))
            Line((7.323223305, 223.5), (7.323223305, 231.5))
            ThreePointArc((7.323223305, 231.5), (-0.176776695, 239), (-7.676776695, 231.5))
        make_face()
    cut_extrude_3_tool1 = extrude(cut_extrude_3_sk1.sketch, amount=-CUT_EXTRUDE_3_REACH, mode=Mode.PRIVATE) & part.part
    add(cut_extrude_3_tool1.solids().sort_by_distance((-0.176777, 221.5, -230.54611))[0], mode=Mode.SUBTRACT)

    # 草图7 → 切除-拉伸4 (cut, up to next)
    with BuildSketch(Plane(origin=(0, 221.5, 0), x_dir=(1, 0, 0), z_dir=(0, 1, 0)), mode=Mode.PRIVATE) as cut_extrude_4_sk1:
        with BuildLine():
            Line((101.5, 213), (101.5, 210))
            ThreePointArc((101.5, 210), (99, 207.5), (96.5, 210))
            Line((96.5, 210), (96.5, 213))
            ThreePointArc((96.5, 213), (99, 215.5), (101.5, 213))
        make_face()
    cut_extrude_4_tool1 = extrude(cut_extrude_4_sk1.sketch, amount=-CUT_EXTRUDE_4_REACH, mode=Mode.PRIVATE) & part.part
    # 草图7 → 切除-拉伸4 (cut, up to next)
    with BuildSketch(Plane(origin=(0, 221.5, 0), x_dir=(1, 0, 0), z_dir=(0, 1, 0)), mode=Mode.PRIVATE) as cut_extrude_4_sk2:
        with BuildLine():
            Line((101.5, 50), (101.5, 53))
            ThreePointArc((101.5, 53), (99, 55.5), (96.5, 53))
            Line((96.5, 53), (96.5, 50))
            ThreePointArc((96.5, 50), (99, 47.5), (101.5, 50))
        make_face()
    cut_extrude_4_tool2 = extrude(cut_extrude_4_sk2.sketch, amount=-CUT_EXTRUDE_4_REACH, mode=Mode.PRIVATE) & part.part
    # 草图7 → 切除-拉伸4 (cut, up to next)
    with BuildSketch(Plane(origin=(0, 221.5, 0), x_dir=(1, 0, 0), z_dir=(0, 1, 0)), mode=Mode.PRIVATE) as cut_extrude_4_sk3:
        with BuildLine():
            Line((-101.5, 213), (-101.5, 210))
            ThreePointArc((-101.5, 210), (-99, 207.5), (-96.5, 210))
            Line((-96.5, 210), (-96.5, 213))
            ThreePointArc((-96.5, 213), (-99, 215.5), (-101.5, 213))
        make_face()
    cut_extrude_4_tool3 = extrude(cut_extrude_4_sk3.sketch, amount=-CUT_EXTRUDE_4_REACH, mode=Mode.PRIVATE) & part.part
    # 草图7 → 切除-拉伸4 (cut, up to next)
    with BuildSketch(Plane(origin=(0, 221.5, 0), x_dir=(1, 0, 0), z_dir=(0, 1, 0)), mode=Mode.PRIVATE) as cut_extrude_4_sk4:
        with BuildLine():
            Line((-101.5, 50), (-101.5, 53))
            ThreePointArc((-101.5, 53), (-99, 55.5), (-96.5, 53))
            Line((-96.5, 53), (-96.5, 50))
            ThreePointArc((-96.5, 50), (-99, 47.5), (-101.5, 50))
        make_face()
    cut_extrude_4_tool4 = extrude(cut_extrude_4_sk4.sketch, amount=-CUT_EXTRUDE_4_REACH, mode=Mode.PRIVATE) & part.part
    add(cut_extrude_4_tool1.solids().sort_by_distance((99, 221.5, -211.5))[0], mode=Mode.SUBTRACT)
    add(cut_extrude_4_tool2.solids().sort_by_distance((99, 221.5, -51.5))[0], mode=Mode.SUBTRACT)
    add(cut_extrude_4_tool3.solids().sort_by_distance((-99, 221.5, -211.5))[0], mode=Mode.SUBTRACT)
    add(cut_extrude_4_tool4.solids().sort_by_distance((-99, 221.5, -51.5))[0], mode=Mode.SUBTRACT)

    # 草图8 → 切除-拉伸5 (cut, up to next)
    with BuildSketch(Plane.XY, mode=Mode.PRIVATE) as cut_extrude_5_sk1:
        with BuildLine():
            Line((-96.5, 121.5), (-96.5, 118.5))
            ThreePointArc((-96.5, 118.5), (-99, 116), (-101.5, 118.5))
            Line((-101.5, 118.5), (-101.5, 121.5))
            ThreePointArc((-101.5, 121.5), (-99, 124), (-96.5, 121.5))
        make_face()
    cut_extrude_5_tool1 = extrude(cut_extrude_5_sk1.sketch, amount=-CUT_EXTRUDE_5_REACH, mode=Mode.PRIVATE) & part.part
    # 草图8 → 切除-拉伸5 (cut, up to next)
    with BuildSketch(Plane.XY, mode=Mode.PRIVATE) as cut_extrude_5_sk2:
        with BuildLine():
            Line((96.5, 121.5), (96.5, 118.5))
            ThreePointArc((96.5, 118.5), (99, 116), (101.5, 118.5))
            Line((101.5, 118.5), (101.5, 121.5))
            ThreePointArc((101.5, 121.5), (99, 124), (96.5, 121.5))
        make_face()
    cut_extrude_5_tool2 = extrude(cut_extrude_5_sk2.sketch, amount=-CUT_EXTRUDE_5_REACH, mode=Mode.PRIVATE) & part.part
    # 草图8 → 切除-拉伸5 (cut, up to next)
    with BuildSketch(Plane.XY, mode=Mode.PRIVATE) as cut_extrude_5_sk3:
        with BuildLine():
            Line((-96.5, 18.5), (-96.5, 21.5))
            ThreePointArc((-96.5, 21.5), (-99, 24), (-101.5, 21.5))
            Line((-101.5, 21.5), (-101.5, 18.5))
            ThreePointArc((-101.5, 18.5), (-99, 16), (-96.5, 18.5))
        make_face()
    cut_extrude_5_tool3 = extrude(cut_extrude_5_sk3.sketch, amount=-CUT_EXTRUDE_5_REACH, mode=Mode.PRIVATE) & part.part
    # 草图8 → 切除-拉伸5 (cut, up to next)
    with BuildSketch(Plane.XY, mode=Mode.PRIVATE) as cut_extrude_5_sk4:
        with BuildLine():
            Line((96.5, 18.5), (96.5, 21.5))
            ThreePointArc((96.5, 21.5), (99, 24), (101.5, 21.5))
            Line((101.5, 21.5), (101.5, 18.5))
            ThreePointArc((101.5, 18.5), (99, 16), (96.5, 18.5))
        make_face()
    cut_extrude_5_tool4 = extrude(cut_extrude_5_sk4.sketch, amount=-CUT_EXTRUDE_5_REACH, mode=Mode.PRIVATE) & part.part
    add(cut_extrude_5_tool1.solids().sort_by_distance((-99, 120, 0))[0], mode=Mode.SUBTRACT)
    add(cut_extrude_5_tool2.solids().sort_by_distance((99, 120, 0))[0], mode=Mode.SUBTRACT)
    add(cut_extrude_5_tool3.solids().sort_by_distance((-99, 20, 0))[0], mode=Mode.SUBTRACT)
    add(cut_extrude_5_tool4.solids().sort_by_distance((99, 20, 0))[0], mode=Mode.SUBTRACT)

    # M4 间隙孔1 (through all)
    with Locations(Plane.ZY.offset(131.7)):
        with Locations((-241.5, 128), (-135.5, 20)):
            Hole(HOLE_WIZARD_M4_1_D / 2)


solid = part.part
